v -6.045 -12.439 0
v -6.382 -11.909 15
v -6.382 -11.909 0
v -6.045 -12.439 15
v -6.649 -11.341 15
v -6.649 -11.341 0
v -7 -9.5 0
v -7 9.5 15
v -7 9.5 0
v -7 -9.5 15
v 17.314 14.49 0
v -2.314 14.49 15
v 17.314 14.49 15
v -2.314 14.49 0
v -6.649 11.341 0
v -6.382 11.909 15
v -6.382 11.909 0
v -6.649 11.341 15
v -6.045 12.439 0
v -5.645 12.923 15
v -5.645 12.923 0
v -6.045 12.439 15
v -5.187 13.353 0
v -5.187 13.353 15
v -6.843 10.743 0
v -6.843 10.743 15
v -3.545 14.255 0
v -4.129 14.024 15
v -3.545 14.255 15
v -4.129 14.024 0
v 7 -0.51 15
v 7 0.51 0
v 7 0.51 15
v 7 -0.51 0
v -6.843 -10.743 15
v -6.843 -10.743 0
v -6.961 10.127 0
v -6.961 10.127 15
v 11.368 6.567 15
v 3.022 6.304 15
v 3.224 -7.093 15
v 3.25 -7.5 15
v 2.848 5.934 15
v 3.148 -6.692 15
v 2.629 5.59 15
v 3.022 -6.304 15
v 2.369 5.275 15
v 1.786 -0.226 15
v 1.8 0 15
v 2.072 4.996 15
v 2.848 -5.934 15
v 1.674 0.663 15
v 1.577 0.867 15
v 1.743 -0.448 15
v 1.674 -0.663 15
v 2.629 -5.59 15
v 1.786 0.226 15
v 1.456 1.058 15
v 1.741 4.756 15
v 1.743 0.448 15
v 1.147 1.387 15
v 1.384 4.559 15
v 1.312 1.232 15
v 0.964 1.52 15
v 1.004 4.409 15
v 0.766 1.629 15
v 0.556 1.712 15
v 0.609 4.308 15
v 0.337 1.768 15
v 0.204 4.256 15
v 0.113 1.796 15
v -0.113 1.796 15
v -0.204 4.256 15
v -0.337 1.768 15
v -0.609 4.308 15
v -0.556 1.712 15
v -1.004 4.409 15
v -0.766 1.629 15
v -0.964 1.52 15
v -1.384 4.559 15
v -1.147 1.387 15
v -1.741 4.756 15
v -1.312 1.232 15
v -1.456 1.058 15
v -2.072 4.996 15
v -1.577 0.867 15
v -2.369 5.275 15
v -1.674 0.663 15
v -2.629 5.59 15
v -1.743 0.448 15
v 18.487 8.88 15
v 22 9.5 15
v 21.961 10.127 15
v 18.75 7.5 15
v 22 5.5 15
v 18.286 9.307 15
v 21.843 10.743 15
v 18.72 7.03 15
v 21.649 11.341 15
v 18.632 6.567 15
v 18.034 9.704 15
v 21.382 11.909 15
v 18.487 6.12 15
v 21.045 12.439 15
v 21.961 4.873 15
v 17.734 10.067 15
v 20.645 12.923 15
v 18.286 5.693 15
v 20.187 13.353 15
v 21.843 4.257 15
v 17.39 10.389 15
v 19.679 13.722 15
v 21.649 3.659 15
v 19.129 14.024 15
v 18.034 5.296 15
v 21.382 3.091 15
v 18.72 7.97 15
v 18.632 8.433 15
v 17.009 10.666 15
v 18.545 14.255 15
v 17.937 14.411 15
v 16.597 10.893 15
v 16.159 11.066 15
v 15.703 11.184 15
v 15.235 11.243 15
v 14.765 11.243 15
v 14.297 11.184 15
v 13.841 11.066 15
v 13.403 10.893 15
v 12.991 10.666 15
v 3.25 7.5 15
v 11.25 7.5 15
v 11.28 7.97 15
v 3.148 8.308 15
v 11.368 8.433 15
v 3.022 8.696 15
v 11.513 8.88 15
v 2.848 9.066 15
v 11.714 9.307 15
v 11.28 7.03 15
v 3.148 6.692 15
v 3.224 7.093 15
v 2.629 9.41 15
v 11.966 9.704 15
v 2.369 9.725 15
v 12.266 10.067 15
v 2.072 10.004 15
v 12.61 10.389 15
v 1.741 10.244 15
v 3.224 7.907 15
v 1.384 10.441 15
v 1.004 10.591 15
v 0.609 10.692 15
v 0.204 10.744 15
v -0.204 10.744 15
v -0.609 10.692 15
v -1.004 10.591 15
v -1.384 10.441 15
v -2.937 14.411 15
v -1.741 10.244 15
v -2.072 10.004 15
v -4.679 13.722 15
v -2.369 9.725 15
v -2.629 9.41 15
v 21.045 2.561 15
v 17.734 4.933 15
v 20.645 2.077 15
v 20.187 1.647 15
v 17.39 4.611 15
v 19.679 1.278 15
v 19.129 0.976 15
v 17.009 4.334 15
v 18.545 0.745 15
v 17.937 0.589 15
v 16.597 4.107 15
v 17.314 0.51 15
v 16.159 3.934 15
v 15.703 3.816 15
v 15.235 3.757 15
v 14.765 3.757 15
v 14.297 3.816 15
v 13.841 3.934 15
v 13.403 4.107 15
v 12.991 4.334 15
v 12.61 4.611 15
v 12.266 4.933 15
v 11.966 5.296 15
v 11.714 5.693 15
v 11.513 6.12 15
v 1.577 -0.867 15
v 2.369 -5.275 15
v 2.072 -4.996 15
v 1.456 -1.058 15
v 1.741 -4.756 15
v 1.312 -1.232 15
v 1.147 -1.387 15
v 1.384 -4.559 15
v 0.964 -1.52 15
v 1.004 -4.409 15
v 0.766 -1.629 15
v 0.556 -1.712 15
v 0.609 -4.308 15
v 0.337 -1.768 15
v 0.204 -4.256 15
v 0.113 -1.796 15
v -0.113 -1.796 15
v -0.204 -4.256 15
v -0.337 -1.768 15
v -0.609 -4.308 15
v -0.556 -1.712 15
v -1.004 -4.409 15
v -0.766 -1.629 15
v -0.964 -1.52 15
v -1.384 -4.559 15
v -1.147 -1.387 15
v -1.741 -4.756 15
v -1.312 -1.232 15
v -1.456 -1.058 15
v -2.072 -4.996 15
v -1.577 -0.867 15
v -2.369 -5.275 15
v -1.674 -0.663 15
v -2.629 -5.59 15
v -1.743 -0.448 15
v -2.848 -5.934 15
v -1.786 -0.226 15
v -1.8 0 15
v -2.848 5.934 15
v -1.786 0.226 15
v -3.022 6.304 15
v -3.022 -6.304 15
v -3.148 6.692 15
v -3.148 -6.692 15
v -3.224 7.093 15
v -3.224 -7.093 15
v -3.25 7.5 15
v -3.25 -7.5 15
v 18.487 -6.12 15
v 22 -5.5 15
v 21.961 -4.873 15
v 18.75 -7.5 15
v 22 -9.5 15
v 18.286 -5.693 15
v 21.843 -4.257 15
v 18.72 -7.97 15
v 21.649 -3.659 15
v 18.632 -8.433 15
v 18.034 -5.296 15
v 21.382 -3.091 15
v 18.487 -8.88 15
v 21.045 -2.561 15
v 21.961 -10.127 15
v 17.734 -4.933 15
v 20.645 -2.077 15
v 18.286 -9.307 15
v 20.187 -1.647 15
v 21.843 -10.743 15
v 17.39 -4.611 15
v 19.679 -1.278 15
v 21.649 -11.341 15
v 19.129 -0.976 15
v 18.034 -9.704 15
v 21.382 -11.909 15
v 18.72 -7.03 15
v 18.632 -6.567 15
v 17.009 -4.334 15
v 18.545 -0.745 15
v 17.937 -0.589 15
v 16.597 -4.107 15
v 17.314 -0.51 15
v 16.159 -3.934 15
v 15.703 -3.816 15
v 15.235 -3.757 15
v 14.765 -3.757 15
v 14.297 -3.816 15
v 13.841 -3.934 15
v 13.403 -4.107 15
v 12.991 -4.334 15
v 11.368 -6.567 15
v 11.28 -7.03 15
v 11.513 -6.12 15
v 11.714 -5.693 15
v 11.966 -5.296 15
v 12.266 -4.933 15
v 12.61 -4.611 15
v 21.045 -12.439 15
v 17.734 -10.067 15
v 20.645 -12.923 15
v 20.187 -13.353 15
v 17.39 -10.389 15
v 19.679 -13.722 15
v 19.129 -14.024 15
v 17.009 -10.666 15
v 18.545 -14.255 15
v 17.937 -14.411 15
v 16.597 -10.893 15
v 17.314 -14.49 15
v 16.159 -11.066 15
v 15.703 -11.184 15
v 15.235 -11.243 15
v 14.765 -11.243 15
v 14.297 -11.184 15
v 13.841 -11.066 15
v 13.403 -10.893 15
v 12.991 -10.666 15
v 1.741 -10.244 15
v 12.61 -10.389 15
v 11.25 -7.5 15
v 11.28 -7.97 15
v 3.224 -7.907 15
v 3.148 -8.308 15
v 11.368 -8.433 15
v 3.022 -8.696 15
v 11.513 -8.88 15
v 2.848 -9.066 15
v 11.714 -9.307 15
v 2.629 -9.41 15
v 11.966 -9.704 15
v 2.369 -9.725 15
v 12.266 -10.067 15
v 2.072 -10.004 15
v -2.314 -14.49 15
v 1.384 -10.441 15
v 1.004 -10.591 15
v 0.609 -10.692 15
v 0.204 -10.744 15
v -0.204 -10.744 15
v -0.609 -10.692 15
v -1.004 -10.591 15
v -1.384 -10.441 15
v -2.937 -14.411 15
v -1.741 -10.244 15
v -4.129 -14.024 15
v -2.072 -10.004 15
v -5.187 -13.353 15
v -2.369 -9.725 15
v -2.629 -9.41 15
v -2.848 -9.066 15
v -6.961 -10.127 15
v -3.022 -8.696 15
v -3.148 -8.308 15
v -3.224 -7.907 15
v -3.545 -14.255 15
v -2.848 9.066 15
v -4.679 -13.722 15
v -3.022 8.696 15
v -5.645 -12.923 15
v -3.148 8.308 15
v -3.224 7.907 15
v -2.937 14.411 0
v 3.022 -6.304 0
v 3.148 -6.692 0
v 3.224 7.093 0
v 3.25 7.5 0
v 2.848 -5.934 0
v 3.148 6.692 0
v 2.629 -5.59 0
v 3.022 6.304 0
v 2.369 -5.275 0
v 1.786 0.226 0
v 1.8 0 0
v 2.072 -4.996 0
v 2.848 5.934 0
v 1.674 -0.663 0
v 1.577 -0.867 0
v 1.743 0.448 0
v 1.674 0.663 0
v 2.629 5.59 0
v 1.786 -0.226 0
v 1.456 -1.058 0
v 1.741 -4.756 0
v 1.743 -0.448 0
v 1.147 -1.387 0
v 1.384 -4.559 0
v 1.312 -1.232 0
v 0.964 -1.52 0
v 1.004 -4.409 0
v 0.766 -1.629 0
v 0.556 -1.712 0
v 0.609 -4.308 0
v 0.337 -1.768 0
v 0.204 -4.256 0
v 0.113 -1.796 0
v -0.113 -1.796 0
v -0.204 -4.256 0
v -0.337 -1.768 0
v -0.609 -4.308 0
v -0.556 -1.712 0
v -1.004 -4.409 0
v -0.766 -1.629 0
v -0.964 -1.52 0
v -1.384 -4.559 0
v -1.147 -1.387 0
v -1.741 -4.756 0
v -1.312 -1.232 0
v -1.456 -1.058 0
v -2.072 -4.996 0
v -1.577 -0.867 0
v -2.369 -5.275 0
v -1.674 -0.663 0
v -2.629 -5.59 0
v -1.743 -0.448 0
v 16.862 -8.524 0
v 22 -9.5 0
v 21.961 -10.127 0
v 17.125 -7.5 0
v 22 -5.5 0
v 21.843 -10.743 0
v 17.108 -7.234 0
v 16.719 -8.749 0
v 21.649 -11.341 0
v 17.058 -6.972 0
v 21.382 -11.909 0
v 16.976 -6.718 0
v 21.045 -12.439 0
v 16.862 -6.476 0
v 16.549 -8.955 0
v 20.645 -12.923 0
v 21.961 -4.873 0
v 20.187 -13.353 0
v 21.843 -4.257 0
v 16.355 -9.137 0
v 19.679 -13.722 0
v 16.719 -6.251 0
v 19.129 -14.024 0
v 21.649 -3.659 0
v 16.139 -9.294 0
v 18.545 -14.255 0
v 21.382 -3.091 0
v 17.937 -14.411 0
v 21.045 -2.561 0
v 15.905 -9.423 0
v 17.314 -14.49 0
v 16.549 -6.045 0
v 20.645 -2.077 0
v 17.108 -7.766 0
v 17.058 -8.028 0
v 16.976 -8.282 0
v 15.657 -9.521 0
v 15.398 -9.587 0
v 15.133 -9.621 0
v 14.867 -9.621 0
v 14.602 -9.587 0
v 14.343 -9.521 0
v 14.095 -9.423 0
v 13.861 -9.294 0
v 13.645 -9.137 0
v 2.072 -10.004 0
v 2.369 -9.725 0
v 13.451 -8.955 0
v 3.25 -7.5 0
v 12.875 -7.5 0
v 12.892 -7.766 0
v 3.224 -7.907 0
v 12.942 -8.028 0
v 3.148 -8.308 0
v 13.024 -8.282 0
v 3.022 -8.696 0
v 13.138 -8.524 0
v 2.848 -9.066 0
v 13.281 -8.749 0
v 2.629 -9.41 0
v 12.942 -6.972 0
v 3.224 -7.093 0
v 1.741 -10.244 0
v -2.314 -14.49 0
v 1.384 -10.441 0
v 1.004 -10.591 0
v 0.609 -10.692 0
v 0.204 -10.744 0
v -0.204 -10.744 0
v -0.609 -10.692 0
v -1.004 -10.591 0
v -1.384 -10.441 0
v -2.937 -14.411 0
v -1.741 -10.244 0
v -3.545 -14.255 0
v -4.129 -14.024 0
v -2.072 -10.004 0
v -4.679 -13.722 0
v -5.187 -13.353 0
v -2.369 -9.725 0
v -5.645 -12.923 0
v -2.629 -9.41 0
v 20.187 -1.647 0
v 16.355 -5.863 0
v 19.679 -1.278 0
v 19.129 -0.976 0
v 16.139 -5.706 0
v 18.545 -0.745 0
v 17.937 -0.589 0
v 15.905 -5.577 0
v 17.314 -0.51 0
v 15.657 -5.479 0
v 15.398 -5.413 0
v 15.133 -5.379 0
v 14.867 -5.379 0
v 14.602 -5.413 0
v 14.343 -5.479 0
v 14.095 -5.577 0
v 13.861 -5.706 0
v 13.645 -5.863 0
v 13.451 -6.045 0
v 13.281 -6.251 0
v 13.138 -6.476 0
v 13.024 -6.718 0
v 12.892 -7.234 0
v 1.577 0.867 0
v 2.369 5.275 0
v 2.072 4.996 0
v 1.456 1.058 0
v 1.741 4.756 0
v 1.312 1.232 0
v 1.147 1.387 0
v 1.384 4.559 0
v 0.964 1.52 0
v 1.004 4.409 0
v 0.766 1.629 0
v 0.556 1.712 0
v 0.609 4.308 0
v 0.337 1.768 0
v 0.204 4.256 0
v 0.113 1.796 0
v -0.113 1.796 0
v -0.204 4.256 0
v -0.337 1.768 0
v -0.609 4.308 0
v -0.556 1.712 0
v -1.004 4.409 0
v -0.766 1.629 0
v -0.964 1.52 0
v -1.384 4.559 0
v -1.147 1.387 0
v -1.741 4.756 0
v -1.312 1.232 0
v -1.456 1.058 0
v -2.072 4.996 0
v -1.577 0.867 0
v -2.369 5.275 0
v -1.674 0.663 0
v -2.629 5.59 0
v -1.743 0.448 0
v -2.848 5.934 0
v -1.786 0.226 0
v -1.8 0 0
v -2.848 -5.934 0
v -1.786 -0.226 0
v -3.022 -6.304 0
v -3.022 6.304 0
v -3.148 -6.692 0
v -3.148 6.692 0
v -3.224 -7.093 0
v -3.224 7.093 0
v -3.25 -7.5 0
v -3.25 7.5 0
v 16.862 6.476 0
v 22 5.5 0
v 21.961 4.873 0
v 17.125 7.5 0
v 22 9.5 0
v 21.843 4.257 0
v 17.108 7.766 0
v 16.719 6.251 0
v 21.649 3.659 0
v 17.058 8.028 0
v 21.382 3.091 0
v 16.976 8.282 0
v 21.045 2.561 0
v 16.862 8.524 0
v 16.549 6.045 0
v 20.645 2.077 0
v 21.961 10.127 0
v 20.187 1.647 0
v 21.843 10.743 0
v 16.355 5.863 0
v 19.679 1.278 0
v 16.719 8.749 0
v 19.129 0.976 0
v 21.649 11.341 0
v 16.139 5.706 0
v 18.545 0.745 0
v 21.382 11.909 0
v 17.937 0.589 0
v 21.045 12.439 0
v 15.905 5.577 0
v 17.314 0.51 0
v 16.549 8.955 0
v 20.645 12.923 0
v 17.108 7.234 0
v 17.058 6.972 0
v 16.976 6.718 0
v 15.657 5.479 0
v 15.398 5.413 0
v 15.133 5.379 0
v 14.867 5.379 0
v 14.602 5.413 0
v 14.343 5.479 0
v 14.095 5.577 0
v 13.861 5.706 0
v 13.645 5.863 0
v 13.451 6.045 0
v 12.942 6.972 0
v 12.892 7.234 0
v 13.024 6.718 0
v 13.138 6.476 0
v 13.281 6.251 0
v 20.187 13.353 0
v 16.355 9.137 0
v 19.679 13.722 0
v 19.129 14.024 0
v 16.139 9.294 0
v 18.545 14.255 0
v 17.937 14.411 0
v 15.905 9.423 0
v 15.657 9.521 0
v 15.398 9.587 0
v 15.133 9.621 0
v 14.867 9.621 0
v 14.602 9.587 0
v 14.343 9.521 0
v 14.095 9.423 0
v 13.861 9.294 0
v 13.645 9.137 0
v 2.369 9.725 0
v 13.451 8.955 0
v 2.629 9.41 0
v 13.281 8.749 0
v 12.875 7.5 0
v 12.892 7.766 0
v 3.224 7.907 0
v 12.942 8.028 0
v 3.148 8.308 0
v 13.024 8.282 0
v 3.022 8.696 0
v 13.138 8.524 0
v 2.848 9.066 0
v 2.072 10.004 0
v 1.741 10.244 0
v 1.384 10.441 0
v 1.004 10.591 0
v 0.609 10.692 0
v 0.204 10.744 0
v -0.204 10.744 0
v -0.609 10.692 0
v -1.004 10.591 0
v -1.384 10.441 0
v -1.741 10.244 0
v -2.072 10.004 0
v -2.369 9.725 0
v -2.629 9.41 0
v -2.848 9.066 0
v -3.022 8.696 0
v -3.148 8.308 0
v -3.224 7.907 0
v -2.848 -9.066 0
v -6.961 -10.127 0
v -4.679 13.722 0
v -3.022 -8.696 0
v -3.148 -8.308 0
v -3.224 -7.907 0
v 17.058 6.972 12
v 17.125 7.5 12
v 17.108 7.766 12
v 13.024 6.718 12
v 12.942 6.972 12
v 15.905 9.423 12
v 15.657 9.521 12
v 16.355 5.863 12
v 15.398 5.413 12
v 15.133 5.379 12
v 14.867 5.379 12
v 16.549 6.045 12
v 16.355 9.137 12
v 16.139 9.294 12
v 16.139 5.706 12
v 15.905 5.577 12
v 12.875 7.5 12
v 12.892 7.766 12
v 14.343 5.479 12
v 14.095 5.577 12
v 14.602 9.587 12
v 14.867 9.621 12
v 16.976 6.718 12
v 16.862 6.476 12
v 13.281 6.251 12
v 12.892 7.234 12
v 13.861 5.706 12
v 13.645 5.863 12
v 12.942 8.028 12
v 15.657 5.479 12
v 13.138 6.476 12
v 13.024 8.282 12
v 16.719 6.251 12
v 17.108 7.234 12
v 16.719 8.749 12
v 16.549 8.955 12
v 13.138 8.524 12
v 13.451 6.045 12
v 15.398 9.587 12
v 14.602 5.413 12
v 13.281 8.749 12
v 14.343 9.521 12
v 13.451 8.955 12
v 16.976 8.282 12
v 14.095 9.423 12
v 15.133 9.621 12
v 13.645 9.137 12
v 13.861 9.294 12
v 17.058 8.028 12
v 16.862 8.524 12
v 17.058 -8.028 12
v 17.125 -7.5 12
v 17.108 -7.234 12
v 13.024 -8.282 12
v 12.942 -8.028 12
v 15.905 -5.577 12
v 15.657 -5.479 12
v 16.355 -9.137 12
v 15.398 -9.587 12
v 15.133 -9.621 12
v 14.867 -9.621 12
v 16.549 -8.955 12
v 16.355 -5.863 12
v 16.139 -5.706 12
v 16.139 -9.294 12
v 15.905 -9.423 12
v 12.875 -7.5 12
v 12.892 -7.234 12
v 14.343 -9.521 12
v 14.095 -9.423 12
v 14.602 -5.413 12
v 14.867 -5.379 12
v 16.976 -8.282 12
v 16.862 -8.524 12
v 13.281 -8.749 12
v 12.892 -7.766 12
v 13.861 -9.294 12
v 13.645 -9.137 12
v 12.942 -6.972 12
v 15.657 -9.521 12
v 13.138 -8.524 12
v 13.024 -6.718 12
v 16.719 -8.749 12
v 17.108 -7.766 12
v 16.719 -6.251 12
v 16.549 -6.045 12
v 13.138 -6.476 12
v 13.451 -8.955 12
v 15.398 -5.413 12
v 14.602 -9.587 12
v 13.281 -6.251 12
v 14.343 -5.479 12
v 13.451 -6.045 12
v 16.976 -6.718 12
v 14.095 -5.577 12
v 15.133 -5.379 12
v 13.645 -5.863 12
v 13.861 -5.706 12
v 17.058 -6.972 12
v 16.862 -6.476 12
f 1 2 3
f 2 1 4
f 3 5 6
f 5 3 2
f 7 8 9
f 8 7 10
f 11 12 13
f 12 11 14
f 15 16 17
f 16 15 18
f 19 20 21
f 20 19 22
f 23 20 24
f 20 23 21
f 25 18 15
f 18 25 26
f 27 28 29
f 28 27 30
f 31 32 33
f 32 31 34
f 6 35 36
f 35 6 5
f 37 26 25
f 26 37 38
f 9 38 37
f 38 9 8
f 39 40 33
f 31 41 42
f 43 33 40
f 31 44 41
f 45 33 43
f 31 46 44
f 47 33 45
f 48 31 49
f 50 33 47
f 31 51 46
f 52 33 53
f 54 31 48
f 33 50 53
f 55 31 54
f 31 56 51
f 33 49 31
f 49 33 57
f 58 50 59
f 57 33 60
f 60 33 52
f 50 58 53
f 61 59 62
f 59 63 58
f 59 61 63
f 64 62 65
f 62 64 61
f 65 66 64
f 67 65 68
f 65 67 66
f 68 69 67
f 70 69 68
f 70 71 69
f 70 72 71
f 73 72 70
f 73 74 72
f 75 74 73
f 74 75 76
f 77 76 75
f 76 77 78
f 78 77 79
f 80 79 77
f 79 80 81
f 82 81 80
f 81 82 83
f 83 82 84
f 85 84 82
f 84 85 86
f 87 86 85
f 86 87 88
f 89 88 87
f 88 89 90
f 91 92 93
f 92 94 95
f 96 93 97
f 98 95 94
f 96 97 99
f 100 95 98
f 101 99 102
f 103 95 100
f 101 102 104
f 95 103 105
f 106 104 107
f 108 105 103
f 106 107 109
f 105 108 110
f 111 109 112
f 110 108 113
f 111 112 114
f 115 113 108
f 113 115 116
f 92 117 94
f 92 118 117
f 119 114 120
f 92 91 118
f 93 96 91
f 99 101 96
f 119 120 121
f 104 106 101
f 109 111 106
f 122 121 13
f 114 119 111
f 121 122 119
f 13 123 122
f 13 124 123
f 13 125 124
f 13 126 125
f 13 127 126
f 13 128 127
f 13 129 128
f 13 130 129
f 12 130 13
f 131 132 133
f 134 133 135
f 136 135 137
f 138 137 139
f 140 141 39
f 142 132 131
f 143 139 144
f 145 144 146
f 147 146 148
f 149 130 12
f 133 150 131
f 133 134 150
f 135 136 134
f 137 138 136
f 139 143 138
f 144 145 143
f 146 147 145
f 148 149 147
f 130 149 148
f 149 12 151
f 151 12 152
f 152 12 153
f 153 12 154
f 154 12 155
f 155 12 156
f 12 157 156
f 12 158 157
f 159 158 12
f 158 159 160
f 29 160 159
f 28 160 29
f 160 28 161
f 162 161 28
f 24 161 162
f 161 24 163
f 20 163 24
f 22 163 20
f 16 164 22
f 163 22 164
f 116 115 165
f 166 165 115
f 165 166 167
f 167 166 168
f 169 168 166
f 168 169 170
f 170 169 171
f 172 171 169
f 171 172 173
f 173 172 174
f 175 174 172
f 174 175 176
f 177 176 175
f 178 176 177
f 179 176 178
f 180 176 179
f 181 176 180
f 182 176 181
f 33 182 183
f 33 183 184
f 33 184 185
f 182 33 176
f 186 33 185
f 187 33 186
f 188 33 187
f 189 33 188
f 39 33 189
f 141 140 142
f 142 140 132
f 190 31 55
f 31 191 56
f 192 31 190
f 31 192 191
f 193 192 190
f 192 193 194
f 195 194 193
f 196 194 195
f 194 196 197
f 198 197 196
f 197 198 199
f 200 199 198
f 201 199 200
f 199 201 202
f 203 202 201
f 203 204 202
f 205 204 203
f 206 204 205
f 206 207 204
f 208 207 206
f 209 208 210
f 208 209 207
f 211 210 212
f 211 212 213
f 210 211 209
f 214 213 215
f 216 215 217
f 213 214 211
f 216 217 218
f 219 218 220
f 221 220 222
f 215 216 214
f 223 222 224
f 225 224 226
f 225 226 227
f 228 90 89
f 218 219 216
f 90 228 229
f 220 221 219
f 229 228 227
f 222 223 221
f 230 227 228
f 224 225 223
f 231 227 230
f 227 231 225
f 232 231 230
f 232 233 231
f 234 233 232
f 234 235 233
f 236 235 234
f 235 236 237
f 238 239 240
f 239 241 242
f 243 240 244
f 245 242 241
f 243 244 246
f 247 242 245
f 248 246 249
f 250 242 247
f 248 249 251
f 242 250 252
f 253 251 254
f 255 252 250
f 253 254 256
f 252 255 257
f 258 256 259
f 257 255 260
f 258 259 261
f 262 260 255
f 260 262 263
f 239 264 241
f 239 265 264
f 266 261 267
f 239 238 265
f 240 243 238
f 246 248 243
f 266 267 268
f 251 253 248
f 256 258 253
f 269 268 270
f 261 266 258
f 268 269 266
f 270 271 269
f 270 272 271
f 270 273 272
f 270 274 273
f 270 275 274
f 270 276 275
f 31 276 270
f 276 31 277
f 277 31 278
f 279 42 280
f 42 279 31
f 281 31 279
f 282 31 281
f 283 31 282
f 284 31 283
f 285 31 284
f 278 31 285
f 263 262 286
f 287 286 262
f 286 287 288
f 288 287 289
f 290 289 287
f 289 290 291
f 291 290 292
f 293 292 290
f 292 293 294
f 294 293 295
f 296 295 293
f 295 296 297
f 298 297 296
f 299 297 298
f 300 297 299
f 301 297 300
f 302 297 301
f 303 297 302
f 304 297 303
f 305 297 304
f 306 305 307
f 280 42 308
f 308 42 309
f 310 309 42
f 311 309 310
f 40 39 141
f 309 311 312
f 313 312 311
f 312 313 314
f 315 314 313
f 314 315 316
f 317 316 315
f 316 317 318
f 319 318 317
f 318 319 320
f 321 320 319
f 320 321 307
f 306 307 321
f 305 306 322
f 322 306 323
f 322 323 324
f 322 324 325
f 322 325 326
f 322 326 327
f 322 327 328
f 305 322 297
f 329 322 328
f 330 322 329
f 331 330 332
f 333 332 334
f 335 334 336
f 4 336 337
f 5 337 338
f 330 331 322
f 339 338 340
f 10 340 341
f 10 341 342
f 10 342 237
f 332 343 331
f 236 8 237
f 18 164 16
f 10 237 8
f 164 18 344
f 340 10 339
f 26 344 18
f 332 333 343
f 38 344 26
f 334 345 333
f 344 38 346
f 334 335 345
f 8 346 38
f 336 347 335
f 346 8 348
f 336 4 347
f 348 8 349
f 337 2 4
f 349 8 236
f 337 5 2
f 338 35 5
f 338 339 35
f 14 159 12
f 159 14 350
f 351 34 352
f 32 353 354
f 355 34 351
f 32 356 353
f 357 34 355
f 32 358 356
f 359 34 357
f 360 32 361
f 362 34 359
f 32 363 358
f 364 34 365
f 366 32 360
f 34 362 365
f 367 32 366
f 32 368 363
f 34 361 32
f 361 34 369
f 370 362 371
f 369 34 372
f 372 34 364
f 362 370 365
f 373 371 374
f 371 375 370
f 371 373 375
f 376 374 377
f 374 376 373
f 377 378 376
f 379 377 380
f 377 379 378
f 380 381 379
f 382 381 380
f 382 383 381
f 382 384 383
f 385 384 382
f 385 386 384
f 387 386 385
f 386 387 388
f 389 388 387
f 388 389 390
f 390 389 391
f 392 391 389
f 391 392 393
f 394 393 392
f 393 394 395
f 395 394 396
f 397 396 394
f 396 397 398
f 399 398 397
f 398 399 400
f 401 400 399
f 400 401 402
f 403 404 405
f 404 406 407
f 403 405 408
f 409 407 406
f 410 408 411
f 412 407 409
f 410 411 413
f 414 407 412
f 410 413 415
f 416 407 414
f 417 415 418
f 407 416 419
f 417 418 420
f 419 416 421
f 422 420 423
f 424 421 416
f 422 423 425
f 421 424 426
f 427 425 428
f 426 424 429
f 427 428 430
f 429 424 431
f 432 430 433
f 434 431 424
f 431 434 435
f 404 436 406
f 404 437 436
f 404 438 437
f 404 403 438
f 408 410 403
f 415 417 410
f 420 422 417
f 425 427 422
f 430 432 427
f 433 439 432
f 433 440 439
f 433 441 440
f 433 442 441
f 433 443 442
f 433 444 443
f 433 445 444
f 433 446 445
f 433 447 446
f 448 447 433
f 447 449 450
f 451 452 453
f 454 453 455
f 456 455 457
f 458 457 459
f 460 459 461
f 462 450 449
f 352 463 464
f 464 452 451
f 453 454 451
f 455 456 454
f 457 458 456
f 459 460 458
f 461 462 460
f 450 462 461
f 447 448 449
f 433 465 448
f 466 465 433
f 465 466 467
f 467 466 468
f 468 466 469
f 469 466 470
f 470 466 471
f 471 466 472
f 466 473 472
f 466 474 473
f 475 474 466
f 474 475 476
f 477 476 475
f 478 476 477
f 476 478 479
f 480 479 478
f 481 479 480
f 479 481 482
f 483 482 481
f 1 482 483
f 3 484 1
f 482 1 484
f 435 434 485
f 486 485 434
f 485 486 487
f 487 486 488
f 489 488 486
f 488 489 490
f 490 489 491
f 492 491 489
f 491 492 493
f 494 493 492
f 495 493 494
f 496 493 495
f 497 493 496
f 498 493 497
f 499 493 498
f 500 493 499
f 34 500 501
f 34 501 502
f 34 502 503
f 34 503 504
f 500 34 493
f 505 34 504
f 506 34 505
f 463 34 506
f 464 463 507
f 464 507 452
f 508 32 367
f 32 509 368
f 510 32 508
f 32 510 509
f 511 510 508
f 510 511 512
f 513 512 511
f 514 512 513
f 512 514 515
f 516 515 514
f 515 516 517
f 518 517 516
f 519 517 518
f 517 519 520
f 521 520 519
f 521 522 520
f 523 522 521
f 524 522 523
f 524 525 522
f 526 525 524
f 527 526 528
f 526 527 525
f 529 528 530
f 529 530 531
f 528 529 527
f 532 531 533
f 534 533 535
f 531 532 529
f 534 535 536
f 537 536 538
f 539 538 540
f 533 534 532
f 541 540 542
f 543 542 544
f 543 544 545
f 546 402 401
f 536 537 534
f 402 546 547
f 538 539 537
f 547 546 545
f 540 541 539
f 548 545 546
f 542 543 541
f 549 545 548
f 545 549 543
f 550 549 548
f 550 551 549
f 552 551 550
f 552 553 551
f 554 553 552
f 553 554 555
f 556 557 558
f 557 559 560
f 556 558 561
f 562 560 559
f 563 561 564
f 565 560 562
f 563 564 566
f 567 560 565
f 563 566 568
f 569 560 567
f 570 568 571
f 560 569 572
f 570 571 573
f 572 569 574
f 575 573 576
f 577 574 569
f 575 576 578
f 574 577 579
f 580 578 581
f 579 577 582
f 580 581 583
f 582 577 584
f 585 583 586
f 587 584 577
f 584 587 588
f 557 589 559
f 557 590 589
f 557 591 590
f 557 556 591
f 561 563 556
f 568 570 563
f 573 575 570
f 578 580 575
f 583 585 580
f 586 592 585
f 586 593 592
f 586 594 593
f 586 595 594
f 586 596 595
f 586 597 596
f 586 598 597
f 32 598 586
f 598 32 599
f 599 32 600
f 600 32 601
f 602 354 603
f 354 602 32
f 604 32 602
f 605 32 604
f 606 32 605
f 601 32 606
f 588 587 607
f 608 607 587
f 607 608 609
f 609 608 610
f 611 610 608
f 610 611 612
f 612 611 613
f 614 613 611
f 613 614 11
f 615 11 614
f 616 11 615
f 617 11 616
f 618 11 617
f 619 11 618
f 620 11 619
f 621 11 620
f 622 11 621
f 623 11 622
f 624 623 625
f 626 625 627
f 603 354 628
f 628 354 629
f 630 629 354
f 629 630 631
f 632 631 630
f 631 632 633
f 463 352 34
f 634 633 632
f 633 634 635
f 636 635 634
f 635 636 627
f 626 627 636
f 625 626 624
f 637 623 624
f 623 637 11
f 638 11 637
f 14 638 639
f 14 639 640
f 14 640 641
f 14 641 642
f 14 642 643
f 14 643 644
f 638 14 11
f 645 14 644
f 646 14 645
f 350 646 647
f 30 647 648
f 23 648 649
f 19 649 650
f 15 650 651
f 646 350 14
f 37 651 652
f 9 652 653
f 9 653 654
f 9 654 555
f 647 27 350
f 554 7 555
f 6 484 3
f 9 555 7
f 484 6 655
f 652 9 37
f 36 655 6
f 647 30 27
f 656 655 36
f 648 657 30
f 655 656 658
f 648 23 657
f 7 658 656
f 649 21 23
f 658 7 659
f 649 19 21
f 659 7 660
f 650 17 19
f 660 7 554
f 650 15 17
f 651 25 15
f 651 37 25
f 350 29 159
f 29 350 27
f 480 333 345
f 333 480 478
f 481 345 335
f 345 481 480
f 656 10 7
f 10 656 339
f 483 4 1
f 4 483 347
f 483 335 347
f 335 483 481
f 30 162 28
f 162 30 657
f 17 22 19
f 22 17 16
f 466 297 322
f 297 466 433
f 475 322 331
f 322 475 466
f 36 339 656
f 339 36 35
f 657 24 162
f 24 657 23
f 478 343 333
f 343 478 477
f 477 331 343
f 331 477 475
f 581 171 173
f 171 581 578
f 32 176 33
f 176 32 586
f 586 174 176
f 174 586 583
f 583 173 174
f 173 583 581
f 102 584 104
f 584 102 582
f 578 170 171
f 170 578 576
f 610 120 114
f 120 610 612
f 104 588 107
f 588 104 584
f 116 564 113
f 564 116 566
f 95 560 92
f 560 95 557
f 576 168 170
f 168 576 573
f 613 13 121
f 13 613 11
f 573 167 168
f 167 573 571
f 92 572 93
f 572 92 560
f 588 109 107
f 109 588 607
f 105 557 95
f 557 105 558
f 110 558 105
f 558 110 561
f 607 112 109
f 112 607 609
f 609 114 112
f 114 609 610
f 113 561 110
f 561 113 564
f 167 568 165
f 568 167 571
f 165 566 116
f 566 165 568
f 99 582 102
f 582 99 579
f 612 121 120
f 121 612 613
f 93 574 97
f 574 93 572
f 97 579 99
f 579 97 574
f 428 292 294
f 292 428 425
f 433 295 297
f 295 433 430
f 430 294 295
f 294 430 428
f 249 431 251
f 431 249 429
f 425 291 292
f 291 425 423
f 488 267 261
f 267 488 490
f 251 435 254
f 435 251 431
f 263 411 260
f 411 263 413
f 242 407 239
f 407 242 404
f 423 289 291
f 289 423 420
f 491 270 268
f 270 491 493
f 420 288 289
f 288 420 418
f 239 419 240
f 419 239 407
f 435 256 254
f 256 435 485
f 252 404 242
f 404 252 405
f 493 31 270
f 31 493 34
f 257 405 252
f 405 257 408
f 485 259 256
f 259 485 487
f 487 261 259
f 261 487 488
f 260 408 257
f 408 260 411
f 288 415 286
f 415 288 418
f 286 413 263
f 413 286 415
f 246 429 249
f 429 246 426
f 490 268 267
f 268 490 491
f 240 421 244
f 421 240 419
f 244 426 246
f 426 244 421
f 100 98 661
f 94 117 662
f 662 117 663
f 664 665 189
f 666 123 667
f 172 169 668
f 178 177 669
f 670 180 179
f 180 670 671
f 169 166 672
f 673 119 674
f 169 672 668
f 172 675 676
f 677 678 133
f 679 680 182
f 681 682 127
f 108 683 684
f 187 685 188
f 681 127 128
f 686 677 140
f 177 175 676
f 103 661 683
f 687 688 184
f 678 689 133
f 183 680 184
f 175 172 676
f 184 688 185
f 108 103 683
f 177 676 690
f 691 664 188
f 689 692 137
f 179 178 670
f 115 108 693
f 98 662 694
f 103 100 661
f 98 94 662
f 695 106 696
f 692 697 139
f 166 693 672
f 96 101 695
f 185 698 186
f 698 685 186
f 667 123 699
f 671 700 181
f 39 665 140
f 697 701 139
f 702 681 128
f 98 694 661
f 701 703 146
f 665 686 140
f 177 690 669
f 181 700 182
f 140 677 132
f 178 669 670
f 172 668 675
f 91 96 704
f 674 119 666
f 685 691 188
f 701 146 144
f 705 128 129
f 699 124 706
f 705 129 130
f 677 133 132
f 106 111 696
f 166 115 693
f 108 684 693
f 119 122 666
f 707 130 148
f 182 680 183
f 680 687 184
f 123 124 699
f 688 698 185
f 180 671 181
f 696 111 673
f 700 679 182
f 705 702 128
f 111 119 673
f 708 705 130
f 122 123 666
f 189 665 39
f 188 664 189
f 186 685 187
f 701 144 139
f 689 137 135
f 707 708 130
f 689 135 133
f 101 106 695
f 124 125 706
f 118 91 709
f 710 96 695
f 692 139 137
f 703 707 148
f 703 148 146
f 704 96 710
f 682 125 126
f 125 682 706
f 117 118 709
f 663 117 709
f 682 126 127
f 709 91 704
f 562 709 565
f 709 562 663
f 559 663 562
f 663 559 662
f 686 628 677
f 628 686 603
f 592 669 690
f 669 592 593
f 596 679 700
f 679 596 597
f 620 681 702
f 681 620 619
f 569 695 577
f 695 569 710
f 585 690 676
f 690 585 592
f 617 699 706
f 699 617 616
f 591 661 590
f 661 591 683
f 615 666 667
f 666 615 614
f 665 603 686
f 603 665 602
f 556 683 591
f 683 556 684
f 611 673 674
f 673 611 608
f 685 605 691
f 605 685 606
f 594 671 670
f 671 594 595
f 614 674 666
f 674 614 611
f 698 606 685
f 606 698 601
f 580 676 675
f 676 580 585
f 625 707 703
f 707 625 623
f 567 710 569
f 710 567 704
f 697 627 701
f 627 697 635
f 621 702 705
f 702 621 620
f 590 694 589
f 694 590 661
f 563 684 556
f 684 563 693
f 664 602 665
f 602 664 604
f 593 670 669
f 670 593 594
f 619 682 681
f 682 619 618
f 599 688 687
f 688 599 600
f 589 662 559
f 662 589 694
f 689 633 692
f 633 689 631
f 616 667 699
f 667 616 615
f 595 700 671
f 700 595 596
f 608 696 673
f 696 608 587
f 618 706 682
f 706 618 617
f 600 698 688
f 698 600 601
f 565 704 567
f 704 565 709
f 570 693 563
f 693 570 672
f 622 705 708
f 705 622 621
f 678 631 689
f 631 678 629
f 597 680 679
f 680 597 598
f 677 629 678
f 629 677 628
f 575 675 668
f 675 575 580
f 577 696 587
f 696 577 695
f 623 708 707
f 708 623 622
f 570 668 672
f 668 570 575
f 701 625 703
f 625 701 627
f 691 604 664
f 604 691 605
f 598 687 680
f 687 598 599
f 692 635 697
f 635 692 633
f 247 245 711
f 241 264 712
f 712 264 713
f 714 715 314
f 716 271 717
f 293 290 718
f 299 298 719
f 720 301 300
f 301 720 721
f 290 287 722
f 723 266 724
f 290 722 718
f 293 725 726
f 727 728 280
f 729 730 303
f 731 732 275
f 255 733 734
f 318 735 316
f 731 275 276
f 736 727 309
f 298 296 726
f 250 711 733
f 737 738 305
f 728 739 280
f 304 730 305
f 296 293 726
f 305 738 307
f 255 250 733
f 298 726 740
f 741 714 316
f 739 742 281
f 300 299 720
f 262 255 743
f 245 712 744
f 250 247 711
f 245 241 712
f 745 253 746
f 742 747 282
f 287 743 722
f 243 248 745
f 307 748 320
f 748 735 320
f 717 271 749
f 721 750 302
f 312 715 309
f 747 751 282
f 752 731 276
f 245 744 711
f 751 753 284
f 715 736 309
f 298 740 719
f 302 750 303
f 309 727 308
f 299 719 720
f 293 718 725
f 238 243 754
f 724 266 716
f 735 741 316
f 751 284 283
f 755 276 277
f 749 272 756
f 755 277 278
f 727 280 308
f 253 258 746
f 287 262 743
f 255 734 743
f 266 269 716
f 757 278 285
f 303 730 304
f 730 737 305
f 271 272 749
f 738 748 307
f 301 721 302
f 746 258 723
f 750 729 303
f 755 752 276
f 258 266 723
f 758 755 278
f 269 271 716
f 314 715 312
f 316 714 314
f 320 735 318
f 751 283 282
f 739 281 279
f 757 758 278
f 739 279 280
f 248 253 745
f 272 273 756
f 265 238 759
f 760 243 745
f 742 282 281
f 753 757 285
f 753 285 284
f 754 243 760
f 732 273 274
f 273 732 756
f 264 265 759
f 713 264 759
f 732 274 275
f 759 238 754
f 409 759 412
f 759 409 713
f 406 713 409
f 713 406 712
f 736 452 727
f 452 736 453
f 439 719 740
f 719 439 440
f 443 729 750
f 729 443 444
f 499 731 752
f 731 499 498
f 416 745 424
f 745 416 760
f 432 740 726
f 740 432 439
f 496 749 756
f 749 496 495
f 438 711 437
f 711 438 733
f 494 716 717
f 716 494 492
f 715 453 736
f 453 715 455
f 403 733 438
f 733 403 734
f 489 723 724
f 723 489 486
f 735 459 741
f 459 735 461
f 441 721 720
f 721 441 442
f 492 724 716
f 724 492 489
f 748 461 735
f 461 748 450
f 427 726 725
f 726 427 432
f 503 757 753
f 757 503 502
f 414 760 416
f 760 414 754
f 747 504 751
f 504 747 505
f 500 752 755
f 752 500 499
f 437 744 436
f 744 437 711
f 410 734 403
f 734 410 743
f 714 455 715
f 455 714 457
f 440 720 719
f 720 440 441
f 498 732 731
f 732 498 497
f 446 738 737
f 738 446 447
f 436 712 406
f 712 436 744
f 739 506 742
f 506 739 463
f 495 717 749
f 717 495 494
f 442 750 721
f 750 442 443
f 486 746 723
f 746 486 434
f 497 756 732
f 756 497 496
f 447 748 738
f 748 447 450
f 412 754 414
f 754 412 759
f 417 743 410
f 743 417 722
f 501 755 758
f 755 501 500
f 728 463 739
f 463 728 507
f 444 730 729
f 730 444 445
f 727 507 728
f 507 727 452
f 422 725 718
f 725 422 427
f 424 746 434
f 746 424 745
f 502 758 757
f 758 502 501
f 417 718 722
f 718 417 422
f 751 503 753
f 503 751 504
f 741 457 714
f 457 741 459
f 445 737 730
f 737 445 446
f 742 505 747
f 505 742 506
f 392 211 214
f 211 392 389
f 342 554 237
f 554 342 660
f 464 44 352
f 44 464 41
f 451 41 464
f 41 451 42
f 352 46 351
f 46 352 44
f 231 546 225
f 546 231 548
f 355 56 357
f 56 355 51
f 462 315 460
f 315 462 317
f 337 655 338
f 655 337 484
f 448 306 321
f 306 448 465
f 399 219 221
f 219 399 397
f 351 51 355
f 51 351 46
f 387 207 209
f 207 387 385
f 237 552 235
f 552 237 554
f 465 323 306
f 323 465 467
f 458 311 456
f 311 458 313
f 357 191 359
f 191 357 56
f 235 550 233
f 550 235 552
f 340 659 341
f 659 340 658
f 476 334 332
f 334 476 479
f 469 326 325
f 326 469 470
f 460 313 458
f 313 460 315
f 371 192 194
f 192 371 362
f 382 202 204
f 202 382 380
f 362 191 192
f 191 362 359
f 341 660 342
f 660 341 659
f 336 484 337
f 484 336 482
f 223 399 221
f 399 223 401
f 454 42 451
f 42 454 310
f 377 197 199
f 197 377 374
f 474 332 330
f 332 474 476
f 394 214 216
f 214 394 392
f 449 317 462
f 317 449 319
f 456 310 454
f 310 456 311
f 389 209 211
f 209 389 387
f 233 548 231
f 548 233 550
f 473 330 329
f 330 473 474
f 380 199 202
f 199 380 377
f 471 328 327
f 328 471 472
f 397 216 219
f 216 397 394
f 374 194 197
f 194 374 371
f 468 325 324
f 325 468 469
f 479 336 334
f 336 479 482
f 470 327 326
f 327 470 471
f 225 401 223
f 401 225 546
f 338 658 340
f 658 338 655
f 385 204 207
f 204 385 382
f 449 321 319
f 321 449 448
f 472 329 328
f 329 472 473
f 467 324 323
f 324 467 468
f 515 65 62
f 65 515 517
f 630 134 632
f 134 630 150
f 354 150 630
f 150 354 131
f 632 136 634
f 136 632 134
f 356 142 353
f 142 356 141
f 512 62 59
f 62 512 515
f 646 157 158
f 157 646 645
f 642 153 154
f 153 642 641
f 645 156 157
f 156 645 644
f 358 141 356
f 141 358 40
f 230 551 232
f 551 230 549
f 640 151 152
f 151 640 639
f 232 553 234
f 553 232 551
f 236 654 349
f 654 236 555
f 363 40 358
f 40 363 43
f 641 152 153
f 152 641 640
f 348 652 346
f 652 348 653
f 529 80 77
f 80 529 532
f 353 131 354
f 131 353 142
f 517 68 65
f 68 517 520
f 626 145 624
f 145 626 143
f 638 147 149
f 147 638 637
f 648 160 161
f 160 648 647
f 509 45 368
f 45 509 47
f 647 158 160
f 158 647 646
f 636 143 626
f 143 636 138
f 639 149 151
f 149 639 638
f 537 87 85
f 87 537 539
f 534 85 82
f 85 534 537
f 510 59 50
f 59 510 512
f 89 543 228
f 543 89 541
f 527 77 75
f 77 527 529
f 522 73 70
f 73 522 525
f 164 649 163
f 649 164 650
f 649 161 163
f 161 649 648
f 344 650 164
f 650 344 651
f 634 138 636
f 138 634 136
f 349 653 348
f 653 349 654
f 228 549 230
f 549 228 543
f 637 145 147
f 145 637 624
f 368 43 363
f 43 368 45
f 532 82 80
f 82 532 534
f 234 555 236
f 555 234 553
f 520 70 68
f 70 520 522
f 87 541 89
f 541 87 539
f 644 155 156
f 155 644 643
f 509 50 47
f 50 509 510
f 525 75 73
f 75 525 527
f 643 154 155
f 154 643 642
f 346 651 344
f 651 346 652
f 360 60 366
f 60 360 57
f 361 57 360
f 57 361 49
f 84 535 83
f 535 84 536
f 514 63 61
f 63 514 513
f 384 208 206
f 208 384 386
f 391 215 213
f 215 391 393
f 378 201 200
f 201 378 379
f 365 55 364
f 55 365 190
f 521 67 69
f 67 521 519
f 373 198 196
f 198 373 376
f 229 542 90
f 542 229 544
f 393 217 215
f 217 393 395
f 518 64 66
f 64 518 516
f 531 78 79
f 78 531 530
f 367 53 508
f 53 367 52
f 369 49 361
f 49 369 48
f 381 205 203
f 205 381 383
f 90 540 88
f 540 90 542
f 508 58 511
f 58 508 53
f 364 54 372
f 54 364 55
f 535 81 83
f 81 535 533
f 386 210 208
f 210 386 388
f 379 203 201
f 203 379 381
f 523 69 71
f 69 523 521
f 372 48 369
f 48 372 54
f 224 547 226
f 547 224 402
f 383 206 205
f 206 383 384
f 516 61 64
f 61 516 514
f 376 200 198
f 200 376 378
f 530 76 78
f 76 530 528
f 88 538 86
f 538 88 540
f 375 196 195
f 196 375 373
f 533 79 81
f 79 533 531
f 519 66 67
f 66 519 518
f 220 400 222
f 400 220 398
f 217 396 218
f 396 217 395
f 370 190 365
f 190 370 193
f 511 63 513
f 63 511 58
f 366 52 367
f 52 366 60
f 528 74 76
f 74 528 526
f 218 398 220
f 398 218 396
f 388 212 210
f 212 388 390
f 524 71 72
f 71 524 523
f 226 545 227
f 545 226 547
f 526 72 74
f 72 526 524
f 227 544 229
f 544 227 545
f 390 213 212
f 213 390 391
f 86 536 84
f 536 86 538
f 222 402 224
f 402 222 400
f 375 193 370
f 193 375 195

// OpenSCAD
$fn = 50;


difference() {
	union() {
		hull() {
			translate(v = [-2.0000000000, 9.5000000000, 0]) {
				cylinder(h = 15, r = 5);
			}
			translate(v = [2.0000000000, 9.5000000000, 0]) {
				cylinder(h = 15, r = 5);
			}
			translate(v = [-2.0000000000, -9.5000000000, 0]) {
				cylinder(h = 15, r = 5);
			}
			translate(v = [2.0000000000, -9.5000000000, 0]) {
				cylinder(h = 15, r = 5);
			}
		}
		translate(v = [7.5000000000, 7.5000000000, 0]) {
			hull() {
				translate(v = [-9.5000000000, 2.0000000000, 0]) {
					cylinder(h = 15, r = 5);
				}
				translate(v = [9.5000000000, 2.0000000000, 0]) {
					cylinder(h = 15, r = 5);
				}
				translate(v = [-9.5000000000, -2.0000000000, 0]) {
					cylinder(h = 15, r = 5);
				}
				translate(v = [9.5000000000, -2.0000000000, 0]) {
					cylinder(h = 15, r = 5);
				}
			}
		}
		translate(v = [7.5000000000, -7.5000000000, 0]) {
			hull() {
				translate(v = [-9.5000000000, 2.0000000000, 0]) {
					cylinder(h = 15, r = 5);
				}
				translate(v = [9.5000000000, 2.0000000000, 0]) {
					cylinder(h = 15, r = 5);
				}
				translate(v = [-9.5000000000, -2.0000000000, 0]) {
					cylinder(h = 15, r = 5);
				}
				translate(v = [9.5000000000, -2.0000000000, 0]) {
					cylinder(h = 15, r = 5);
				}
			}
		}
	}
	union() {
		translate(v = [15.0000000000, 7.5000000000, 15]) {
			rotate(a = [0, 0, 0]) {
				difference() {
					union() {
						#translate(v = [0, 0, -15.0000000000]) {
							cylinder(h = 15, r = 2.0000000000);
						}
						#translate(v = [0, 0, -3]) {
							cylinder(h = 3, r1 = 2.1250000000, r2 = 3.7500000000);
						}
						#translate(v = [0, 0, -15.0000000000]) {
							cylinder(h = 15, r = 2.1250000000);
						}
						#translate(v = [0, 0, -15.0000000000]) {
							cylinder(h = 15, r = 2.0000000000);
						}
					}
					union();
				}
			}
		}
		translate(v = [15.0000000000, -7.5000000000, 15]) {
			rotate(a = [0, 0, 0]) {
				difference() {
					union() {
						#translate(v = [0, 0, -15.0000000000]) {
							cylinder(h = 15, r = 2.0000000000);
						}
						#translate(v = [0, 0, -3]) {
							cylinder(h = 3, r1 = 2.1250000000, r2 = 3.7500000000);
						}
						#translate(v = [0, 0, -15.0000000000]) {
							cylinder(h = 15, r = 2.1250000000);
						}
						#translate(v = [0, 0, -15.0000000000]) {
							cylinder(h = 15, r = 2.0000000000);
						}
					}
					union();
				}
			}
		}
		translate(v = [0.0000000000, -7.5000000000, 0]) {
			translate(v = [0, 0, -100]) {
				cylinder(h = 200, r = 3.2500000000);
			}
		}
		translate(v = [0.0000000000, 7.5000000000, 0]) {
			translate(v = [0, 0, -100]) {
				cylinder(h = 200, r = 3.2500000000);
			}
		}
		translate(v = [0.0000000000, -7.5000000000, 0]) {
			translate(v = [0, 0, -100]) {
				cylinder(h = 200, r = 1.8000000000);
			}
		}
		translate(v = [0, 0, -100]) {
			cylinder(h = 200, r = 1.8000000000);
		}
		translate(v = [0.0000000000, 7.5000000000, 0]) {
			translate(v = [0, 0, -100]) {
				cylinder(h = 200, r = 1.8000000000);
			}
		}
	}
}
